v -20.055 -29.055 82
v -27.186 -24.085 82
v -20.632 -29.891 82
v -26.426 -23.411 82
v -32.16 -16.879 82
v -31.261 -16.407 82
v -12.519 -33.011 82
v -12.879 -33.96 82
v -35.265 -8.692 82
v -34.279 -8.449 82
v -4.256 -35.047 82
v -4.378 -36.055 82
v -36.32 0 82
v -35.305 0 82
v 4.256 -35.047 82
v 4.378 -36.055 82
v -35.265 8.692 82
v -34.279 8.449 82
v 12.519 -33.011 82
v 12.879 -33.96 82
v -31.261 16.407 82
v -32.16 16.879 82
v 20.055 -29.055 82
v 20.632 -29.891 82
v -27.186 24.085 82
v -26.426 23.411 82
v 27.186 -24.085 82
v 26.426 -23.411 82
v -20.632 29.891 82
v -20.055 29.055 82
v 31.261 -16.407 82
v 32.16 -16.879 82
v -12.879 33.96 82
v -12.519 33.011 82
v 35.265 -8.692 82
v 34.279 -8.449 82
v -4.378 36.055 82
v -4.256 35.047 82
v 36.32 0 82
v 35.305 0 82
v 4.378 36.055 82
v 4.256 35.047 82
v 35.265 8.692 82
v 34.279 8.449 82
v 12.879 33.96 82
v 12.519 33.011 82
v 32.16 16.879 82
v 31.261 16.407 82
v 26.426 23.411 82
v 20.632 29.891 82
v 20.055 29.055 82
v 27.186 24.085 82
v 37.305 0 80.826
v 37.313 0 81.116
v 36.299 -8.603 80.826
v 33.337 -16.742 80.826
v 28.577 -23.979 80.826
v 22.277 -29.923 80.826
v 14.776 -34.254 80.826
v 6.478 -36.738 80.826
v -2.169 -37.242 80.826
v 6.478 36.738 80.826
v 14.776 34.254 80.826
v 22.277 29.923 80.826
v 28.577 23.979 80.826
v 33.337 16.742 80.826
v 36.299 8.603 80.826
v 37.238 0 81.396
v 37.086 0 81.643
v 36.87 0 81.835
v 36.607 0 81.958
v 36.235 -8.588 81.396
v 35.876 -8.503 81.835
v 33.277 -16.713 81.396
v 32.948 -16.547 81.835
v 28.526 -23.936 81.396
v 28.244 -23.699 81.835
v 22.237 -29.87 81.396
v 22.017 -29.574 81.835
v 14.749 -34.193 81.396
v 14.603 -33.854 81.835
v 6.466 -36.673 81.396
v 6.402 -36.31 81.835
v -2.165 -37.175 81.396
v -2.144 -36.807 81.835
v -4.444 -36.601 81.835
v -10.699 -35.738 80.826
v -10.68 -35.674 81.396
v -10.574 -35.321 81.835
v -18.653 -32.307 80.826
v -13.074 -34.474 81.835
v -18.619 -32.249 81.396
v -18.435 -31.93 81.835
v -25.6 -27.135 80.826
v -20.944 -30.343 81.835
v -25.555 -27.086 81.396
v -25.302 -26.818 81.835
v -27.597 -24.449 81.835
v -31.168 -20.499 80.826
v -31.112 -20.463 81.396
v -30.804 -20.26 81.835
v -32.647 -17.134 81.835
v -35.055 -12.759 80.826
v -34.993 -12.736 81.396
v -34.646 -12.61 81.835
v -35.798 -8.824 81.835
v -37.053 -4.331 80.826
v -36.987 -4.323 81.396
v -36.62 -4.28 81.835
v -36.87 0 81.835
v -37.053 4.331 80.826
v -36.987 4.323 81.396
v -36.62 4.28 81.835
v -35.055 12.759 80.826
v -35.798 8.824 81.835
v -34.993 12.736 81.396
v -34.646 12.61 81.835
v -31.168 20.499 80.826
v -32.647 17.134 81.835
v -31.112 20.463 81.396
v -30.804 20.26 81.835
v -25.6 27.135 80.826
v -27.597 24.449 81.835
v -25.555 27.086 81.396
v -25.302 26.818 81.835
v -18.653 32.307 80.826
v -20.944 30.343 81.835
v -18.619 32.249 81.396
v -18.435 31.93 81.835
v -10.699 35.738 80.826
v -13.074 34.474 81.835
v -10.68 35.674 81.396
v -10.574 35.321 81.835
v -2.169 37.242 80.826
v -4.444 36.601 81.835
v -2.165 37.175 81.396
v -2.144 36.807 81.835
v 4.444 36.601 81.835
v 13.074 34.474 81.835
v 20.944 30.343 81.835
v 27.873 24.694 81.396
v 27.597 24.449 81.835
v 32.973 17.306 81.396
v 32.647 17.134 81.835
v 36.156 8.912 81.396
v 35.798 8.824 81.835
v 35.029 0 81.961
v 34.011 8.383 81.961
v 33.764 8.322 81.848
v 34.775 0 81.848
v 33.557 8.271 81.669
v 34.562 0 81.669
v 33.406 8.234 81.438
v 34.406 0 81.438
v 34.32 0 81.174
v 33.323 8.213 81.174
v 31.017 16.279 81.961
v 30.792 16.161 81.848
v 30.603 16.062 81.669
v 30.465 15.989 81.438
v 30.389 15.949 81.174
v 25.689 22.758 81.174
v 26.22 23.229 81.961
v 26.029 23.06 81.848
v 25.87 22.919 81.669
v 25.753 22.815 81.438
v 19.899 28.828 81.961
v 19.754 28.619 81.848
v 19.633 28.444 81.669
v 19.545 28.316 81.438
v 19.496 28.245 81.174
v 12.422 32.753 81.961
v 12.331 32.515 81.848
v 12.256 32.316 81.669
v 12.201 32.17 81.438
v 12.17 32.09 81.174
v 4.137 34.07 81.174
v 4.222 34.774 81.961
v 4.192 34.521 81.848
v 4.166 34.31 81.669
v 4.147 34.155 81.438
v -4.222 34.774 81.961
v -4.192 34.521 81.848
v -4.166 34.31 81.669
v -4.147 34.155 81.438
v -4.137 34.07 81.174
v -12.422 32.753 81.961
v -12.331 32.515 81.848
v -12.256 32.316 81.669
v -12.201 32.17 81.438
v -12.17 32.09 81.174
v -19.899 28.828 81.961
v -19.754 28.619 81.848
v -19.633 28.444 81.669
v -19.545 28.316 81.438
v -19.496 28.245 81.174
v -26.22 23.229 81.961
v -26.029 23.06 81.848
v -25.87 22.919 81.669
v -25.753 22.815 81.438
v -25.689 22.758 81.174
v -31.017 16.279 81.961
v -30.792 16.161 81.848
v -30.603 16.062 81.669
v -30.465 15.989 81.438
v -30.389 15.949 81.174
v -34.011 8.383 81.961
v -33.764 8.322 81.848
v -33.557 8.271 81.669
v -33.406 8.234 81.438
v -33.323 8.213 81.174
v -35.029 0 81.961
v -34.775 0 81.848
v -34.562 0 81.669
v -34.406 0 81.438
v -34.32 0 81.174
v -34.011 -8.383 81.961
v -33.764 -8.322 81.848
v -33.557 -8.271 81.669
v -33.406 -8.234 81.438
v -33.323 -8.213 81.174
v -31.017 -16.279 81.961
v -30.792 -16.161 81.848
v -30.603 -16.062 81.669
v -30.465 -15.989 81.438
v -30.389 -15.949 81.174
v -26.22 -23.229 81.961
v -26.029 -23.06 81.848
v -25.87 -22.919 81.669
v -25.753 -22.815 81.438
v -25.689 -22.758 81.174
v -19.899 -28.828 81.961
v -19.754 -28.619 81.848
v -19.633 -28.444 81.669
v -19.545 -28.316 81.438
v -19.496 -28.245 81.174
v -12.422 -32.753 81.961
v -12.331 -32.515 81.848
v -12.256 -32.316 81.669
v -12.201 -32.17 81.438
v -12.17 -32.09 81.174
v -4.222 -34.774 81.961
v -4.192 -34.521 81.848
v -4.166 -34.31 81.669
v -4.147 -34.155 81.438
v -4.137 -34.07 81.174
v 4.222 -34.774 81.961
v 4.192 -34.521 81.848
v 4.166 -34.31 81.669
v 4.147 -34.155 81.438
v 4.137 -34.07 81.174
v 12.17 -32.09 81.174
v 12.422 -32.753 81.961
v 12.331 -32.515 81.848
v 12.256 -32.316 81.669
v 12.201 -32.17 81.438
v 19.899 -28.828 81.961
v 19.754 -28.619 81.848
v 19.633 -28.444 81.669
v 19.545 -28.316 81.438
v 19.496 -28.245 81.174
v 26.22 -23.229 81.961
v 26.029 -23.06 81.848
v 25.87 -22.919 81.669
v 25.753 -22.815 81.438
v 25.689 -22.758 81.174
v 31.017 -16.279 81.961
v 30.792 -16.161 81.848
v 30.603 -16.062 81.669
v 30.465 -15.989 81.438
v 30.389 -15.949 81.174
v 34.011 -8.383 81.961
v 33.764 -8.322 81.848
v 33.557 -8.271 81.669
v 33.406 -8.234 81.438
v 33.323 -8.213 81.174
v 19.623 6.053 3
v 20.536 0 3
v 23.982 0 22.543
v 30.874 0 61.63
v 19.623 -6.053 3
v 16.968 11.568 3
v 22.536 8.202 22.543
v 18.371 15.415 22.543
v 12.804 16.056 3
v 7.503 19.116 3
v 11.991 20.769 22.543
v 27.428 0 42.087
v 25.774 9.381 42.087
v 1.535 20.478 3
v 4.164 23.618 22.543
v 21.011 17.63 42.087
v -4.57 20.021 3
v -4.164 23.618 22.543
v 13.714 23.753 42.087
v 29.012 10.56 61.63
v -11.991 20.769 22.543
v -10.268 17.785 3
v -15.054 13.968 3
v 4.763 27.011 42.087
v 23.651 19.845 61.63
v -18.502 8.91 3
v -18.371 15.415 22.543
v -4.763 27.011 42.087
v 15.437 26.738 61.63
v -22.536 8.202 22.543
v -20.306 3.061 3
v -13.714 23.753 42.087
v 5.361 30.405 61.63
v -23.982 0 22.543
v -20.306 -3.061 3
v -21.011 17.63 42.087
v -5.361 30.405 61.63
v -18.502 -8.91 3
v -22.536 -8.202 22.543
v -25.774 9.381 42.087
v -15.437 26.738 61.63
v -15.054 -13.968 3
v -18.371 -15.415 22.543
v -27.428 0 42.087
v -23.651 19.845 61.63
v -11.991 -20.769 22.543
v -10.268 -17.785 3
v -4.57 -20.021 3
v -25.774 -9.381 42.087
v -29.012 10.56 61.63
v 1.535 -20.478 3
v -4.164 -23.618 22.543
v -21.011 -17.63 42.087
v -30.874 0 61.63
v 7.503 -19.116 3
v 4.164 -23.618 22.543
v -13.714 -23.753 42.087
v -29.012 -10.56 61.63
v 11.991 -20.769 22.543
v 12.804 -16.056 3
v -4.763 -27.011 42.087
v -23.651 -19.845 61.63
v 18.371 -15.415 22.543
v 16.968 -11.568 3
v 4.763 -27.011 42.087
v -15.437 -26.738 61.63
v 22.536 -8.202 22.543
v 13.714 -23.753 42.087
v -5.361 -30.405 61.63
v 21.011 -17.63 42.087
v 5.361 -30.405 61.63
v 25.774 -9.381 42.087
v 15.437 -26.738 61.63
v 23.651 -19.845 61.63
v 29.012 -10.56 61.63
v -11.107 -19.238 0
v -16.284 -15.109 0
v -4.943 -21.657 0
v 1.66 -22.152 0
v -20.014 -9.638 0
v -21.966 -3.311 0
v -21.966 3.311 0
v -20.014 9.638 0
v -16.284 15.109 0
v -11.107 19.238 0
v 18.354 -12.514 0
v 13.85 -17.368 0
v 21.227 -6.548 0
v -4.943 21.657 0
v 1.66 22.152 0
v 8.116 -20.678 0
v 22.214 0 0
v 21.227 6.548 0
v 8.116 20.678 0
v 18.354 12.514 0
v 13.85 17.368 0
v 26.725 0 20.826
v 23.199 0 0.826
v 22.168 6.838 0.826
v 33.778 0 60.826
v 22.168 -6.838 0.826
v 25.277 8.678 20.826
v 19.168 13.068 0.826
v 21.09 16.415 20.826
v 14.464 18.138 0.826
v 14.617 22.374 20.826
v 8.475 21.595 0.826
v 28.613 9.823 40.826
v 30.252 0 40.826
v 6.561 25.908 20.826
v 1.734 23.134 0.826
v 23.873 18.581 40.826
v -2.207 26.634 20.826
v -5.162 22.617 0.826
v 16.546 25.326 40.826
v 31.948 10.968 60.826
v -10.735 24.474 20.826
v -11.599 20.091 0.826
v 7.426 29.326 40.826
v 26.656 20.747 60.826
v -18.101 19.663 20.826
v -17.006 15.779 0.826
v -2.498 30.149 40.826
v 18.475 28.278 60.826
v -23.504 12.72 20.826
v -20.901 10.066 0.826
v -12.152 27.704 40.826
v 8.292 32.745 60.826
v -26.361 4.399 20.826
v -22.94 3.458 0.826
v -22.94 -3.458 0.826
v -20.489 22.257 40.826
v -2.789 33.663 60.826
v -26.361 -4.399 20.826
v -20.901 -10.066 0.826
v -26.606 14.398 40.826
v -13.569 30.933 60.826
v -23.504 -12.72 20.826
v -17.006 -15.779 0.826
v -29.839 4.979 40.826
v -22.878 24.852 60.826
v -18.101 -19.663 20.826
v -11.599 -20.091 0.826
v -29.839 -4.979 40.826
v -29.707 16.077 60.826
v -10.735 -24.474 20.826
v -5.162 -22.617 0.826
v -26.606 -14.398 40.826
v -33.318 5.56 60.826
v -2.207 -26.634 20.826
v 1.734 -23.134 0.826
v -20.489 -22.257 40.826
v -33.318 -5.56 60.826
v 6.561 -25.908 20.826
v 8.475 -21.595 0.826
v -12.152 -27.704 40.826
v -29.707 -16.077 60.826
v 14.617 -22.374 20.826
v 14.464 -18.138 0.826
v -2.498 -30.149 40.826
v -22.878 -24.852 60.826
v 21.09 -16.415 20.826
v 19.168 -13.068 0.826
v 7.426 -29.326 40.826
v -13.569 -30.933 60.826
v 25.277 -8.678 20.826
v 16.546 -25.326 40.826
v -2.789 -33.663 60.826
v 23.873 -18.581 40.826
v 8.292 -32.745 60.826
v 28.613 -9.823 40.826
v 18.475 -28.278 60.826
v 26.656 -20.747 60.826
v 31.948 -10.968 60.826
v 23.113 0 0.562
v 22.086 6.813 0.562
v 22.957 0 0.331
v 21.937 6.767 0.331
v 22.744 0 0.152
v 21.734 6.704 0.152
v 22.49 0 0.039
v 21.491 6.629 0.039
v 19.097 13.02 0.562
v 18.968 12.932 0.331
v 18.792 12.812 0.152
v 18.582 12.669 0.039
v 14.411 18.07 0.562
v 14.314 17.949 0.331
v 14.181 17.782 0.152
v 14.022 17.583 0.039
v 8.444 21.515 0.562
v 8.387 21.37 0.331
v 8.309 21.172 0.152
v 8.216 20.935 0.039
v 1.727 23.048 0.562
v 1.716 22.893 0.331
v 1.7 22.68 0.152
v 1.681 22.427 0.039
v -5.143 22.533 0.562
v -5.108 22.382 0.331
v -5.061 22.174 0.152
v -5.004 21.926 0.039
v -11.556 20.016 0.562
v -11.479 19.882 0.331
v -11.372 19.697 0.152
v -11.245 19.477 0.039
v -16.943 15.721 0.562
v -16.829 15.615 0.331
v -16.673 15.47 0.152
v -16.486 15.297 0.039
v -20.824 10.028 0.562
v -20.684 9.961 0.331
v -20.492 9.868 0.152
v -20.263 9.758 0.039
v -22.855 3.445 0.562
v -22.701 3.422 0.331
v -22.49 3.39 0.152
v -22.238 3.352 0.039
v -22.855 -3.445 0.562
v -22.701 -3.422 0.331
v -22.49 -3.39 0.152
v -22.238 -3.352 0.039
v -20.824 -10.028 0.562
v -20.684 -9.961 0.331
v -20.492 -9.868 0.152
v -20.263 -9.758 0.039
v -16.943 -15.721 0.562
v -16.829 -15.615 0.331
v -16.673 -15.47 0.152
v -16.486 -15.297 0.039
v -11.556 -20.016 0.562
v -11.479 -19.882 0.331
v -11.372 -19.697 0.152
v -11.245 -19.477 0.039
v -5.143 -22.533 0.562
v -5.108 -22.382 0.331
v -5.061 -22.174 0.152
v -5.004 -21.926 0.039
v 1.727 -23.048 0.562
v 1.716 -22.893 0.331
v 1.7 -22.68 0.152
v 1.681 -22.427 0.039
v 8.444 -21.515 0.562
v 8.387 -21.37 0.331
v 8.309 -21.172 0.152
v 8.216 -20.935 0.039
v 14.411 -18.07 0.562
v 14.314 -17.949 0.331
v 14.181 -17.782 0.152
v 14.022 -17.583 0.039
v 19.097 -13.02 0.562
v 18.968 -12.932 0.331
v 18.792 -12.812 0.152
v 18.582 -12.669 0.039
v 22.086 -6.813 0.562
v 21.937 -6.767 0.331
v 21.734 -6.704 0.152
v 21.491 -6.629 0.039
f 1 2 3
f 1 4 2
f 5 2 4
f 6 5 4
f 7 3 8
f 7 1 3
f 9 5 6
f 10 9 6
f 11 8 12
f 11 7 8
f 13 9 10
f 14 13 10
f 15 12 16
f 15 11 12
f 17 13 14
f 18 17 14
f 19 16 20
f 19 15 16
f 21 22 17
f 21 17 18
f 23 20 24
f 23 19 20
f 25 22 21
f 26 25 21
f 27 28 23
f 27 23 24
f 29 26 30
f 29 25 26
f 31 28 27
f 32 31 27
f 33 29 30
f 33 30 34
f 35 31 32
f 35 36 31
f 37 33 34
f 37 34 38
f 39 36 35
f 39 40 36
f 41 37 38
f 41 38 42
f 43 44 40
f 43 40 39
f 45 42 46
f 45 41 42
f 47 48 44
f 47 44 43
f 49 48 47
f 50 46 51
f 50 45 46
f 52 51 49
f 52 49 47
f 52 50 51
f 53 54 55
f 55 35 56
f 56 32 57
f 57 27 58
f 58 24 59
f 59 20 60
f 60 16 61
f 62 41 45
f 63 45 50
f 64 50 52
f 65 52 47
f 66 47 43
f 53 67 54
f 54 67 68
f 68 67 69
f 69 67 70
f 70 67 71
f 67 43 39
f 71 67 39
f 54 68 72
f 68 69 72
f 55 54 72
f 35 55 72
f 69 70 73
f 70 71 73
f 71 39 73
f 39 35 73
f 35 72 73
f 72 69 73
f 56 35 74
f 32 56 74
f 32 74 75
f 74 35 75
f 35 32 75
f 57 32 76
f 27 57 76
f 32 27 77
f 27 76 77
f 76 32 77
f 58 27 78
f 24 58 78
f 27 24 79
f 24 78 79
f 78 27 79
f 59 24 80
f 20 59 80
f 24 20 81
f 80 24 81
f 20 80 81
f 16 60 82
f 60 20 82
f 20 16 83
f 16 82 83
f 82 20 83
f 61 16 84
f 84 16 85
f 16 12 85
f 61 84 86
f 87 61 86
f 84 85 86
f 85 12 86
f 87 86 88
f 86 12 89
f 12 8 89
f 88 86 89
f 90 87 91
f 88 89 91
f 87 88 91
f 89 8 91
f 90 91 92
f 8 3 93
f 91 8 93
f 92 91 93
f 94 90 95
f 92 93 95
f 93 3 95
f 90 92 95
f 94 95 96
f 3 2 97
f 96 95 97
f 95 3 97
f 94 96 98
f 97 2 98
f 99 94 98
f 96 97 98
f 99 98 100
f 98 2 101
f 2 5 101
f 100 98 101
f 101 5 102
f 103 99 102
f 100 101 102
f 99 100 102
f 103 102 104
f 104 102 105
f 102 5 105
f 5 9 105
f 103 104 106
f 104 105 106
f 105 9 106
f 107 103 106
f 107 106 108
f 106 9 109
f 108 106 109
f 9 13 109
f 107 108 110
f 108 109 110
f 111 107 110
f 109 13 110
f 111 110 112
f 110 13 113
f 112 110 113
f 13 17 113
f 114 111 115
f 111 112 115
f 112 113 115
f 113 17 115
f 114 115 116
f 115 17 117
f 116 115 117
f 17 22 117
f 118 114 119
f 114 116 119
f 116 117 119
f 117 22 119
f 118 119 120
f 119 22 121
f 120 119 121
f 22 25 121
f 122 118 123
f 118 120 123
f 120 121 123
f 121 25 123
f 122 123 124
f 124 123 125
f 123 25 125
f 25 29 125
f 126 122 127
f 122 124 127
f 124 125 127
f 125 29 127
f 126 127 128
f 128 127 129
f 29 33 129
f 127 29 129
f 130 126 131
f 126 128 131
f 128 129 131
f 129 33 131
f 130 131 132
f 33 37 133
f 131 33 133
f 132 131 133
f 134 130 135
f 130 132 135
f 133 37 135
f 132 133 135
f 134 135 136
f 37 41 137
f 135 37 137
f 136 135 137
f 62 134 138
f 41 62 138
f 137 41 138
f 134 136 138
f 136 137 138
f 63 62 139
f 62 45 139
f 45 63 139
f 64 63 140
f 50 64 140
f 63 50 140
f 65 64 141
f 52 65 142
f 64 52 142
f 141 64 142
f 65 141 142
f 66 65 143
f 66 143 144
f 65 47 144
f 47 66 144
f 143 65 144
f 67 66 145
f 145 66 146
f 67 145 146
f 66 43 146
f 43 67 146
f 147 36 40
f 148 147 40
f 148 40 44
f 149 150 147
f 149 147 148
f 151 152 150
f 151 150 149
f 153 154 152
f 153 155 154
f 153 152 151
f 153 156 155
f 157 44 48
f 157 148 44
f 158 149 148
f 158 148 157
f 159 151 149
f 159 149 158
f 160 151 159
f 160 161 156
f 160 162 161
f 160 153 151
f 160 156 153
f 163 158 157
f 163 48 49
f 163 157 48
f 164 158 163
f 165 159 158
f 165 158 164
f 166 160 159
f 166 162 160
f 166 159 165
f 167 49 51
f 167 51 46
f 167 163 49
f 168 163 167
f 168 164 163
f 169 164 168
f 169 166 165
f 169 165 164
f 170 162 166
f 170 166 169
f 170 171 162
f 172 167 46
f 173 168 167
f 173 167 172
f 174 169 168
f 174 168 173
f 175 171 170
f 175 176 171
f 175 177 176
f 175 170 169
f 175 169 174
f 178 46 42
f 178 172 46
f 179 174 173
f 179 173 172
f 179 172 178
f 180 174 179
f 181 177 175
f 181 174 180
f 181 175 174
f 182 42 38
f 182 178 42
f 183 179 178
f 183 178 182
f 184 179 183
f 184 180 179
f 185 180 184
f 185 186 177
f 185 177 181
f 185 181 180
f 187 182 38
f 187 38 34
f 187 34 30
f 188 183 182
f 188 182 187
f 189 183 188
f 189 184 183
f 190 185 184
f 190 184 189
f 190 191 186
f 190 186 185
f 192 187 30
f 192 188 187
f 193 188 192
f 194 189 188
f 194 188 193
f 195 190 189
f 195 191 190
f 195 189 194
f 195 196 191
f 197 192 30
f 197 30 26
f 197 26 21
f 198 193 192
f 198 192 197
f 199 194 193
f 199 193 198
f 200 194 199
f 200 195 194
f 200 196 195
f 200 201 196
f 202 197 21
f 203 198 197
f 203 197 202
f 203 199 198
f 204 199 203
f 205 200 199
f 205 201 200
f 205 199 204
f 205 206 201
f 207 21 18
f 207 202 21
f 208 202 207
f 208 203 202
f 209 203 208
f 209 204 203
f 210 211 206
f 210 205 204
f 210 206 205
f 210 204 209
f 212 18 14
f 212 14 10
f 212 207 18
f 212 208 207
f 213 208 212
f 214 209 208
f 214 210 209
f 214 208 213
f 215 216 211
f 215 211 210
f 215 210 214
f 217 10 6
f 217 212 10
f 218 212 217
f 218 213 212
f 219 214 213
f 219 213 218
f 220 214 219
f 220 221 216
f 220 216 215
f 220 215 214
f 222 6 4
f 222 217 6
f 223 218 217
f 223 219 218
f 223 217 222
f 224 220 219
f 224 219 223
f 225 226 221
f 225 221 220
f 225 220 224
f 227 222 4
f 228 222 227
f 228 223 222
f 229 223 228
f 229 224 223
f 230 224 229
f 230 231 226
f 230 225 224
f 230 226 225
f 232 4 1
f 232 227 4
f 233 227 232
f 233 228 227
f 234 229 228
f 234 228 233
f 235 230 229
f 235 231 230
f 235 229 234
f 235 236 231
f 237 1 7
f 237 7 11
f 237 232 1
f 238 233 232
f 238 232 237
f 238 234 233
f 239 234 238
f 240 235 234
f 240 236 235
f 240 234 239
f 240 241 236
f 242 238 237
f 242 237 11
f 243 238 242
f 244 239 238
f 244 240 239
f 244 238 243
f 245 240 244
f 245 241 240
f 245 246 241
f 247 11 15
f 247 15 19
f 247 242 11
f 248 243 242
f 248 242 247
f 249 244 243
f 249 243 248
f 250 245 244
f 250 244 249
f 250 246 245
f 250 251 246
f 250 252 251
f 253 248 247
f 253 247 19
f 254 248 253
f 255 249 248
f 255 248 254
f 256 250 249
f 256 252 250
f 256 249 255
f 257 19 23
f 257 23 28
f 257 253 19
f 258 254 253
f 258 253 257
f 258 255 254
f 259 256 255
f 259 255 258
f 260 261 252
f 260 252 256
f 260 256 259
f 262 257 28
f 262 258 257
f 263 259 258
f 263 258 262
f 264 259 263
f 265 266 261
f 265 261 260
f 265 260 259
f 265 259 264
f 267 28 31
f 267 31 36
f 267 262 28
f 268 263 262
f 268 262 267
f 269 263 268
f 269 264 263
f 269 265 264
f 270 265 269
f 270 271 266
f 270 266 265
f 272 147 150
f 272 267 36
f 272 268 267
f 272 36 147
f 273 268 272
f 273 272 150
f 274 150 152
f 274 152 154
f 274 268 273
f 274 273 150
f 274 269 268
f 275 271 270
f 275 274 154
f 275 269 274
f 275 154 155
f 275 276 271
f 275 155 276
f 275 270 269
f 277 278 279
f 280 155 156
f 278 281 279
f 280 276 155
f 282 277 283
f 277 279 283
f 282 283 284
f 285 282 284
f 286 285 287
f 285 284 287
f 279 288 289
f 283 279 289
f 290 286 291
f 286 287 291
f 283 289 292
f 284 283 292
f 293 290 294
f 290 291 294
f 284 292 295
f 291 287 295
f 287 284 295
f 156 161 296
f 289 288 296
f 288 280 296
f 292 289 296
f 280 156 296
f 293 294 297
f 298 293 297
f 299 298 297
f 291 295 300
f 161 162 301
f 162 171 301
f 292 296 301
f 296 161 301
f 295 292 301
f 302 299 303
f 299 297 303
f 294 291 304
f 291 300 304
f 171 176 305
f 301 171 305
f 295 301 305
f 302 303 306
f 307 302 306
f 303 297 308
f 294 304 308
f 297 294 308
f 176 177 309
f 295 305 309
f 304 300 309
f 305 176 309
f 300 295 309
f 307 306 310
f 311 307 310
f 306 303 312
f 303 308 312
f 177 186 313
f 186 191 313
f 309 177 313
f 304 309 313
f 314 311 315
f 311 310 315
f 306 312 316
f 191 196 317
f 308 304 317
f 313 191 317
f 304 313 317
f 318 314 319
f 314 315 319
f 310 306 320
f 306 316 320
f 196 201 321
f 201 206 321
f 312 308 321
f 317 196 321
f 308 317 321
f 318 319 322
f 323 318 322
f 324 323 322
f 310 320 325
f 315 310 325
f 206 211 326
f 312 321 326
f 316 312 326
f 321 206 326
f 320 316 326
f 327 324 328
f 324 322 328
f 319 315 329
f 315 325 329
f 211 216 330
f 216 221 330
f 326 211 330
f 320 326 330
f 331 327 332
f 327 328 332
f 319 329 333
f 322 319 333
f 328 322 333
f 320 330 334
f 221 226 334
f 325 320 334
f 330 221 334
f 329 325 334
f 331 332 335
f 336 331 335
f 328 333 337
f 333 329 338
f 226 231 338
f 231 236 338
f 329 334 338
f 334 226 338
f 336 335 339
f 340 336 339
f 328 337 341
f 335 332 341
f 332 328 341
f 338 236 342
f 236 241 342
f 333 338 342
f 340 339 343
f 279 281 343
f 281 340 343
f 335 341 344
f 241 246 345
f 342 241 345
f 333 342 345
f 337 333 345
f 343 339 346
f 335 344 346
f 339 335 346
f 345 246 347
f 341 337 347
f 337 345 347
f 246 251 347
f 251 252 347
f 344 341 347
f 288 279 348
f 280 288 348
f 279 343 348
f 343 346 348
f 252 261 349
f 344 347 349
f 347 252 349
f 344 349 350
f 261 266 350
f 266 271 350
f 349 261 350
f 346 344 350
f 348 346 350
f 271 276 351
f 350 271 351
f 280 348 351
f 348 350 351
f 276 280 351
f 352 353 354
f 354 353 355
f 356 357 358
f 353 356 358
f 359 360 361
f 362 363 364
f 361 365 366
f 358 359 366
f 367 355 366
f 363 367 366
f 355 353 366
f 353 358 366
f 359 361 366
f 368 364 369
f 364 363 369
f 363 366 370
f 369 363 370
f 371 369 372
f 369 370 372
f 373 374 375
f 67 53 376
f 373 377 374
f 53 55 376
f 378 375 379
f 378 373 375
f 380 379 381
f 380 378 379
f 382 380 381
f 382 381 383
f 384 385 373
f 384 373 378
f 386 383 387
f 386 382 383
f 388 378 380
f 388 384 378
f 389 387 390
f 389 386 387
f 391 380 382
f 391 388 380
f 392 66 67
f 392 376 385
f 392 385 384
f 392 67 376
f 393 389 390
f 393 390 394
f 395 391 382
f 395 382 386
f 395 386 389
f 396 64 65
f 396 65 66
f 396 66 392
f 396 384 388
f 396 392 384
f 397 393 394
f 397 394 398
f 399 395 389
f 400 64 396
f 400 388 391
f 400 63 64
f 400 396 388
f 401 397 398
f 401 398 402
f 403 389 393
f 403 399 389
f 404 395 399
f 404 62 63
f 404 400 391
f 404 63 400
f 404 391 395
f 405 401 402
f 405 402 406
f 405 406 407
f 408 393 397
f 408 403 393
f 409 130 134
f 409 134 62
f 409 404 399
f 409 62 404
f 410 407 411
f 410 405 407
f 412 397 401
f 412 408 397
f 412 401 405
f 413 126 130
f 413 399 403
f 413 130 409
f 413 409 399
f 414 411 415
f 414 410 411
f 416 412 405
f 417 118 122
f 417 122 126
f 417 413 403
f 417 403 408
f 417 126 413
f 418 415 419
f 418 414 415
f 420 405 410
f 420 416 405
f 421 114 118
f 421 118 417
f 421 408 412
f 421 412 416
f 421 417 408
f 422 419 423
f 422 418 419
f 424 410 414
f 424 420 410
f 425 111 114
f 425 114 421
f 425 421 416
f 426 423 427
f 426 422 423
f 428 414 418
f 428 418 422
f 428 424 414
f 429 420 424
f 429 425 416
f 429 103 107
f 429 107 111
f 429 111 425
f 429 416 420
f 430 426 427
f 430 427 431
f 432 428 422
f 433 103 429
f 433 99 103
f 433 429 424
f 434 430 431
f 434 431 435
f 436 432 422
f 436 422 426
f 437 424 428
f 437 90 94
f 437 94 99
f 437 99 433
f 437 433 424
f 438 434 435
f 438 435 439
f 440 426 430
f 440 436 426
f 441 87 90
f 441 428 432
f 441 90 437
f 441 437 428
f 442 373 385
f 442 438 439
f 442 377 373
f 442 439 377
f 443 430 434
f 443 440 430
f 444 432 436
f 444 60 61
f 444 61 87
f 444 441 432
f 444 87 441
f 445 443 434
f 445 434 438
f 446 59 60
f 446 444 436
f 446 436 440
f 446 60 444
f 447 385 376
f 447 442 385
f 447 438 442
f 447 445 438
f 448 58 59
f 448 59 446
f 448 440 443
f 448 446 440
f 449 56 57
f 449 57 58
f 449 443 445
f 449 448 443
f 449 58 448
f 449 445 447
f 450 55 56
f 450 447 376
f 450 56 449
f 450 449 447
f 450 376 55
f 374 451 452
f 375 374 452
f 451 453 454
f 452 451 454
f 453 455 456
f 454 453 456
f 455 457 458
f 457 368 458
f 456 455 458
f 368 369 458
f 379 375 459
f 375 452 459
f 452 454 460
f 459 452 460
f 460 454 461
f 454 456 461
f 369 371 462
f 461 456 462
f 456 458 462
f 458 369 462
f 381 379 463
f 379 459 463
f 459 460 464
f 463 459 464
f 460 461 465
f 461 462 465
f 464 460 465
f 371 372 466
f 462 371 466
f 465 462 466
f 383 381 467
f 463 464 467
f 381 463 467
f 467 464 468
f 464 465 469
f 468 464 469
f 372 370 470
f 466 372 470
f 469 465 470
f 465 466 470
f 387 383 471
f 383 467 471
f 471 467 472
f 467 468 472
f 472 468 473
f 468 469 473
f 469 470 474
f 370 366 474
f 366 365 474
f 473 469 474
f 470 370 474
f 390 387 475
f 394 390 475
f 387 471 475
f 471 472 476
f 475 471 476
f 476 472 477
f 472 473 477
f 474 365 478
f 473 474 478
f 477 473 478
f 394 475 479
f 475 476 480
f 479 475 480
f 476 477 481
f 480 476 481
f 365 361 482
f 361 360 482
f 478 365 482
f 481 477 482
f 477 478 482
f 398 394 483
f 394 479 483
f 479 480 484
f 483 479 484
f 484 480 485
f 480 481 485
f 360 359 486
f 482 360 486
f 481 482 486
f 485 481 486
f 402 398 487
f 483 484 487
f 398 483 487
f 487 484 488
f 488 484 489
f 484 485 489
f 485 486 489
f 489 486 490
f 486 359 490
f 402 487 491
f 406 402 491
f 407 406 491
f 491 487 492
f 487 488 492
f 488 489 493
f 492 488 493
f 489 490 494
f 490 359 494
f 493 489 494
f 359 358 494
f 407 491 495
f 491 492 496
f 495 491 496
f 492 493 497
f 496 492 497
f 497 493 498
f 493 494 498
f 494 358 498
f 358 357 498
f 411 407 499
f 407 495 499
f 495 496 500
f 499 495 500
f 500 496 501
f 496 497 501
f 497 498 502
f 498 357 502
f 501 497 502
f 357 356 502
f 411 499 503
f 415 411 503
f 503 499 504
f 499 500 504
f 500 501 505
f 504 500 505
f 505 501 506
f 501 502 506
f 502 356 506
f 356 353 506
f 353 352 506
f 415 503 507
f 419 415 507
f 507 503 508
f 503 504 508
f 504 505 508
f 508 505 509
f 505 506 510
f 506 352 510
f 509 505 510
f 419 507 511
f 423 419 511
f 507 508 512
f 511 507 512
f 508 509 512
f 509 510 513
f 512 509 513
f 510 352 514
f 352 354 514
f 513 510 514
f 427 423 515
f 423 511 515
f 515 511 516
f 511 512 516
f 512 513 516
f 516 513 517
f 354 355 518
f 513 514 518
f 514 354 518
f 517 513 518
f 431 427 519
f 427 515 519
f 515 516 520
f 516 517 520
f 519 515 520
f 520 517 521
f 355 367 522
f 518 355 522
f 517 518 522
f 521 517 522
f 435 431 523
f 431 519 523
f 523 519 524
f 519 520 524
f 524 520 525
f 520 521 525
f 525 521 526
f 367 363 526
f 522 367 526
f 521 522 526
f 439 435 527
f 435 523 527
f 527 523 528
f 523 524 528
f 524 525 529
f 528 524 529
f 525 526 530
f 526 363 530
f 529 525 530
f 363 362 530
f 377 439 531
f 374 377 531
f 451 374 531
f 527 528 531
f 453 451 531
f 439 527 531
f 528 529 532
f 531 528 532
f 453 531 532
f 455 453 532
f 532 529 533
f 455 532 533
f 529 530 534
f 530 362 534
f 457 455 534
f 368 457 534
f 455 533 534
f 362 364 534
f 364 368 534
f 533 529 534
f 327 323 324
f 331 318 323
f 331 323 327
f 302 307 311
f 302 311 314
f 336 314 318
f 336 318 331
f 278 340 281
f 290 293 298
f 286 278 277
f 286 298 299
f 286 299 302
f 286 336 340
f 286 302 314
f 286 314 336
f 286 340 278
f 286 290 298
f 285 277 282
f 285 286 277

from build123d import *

# Parameters (mm, degrees)
F0_R     = 23.0531460168
F1_DEPTH = 82
F1_TAPER = -10
F2_T     = -3
F3_R     = 1


with BuildPart() as f1:
    # F0 (on Top) → F1 (new body)
    with BuildSketch(Plane.XY):
        Circle(F0_R)
    extrude(amount=F1_DEPTH, taper=F1_TAPER)

    # F2
    f2_openings = [f1.faces().sort_by_distance(p)[0] for p in [
        (0, 0, 82),
    ]]
    offset(amount=F2_T, openings=f2_openings, kind=Kind.INTERSECTION)

    # F3
    f3_edges = [f1.edges().sort_by_distance(p)[0] for p in [
        (-37.511958, 0, 82),
        (-34.465679, 0, 82),
        (-23.053146, 0, 0),
    ]]
    fillet(f3_edges, radius=F3_R)


solid = f1.part
